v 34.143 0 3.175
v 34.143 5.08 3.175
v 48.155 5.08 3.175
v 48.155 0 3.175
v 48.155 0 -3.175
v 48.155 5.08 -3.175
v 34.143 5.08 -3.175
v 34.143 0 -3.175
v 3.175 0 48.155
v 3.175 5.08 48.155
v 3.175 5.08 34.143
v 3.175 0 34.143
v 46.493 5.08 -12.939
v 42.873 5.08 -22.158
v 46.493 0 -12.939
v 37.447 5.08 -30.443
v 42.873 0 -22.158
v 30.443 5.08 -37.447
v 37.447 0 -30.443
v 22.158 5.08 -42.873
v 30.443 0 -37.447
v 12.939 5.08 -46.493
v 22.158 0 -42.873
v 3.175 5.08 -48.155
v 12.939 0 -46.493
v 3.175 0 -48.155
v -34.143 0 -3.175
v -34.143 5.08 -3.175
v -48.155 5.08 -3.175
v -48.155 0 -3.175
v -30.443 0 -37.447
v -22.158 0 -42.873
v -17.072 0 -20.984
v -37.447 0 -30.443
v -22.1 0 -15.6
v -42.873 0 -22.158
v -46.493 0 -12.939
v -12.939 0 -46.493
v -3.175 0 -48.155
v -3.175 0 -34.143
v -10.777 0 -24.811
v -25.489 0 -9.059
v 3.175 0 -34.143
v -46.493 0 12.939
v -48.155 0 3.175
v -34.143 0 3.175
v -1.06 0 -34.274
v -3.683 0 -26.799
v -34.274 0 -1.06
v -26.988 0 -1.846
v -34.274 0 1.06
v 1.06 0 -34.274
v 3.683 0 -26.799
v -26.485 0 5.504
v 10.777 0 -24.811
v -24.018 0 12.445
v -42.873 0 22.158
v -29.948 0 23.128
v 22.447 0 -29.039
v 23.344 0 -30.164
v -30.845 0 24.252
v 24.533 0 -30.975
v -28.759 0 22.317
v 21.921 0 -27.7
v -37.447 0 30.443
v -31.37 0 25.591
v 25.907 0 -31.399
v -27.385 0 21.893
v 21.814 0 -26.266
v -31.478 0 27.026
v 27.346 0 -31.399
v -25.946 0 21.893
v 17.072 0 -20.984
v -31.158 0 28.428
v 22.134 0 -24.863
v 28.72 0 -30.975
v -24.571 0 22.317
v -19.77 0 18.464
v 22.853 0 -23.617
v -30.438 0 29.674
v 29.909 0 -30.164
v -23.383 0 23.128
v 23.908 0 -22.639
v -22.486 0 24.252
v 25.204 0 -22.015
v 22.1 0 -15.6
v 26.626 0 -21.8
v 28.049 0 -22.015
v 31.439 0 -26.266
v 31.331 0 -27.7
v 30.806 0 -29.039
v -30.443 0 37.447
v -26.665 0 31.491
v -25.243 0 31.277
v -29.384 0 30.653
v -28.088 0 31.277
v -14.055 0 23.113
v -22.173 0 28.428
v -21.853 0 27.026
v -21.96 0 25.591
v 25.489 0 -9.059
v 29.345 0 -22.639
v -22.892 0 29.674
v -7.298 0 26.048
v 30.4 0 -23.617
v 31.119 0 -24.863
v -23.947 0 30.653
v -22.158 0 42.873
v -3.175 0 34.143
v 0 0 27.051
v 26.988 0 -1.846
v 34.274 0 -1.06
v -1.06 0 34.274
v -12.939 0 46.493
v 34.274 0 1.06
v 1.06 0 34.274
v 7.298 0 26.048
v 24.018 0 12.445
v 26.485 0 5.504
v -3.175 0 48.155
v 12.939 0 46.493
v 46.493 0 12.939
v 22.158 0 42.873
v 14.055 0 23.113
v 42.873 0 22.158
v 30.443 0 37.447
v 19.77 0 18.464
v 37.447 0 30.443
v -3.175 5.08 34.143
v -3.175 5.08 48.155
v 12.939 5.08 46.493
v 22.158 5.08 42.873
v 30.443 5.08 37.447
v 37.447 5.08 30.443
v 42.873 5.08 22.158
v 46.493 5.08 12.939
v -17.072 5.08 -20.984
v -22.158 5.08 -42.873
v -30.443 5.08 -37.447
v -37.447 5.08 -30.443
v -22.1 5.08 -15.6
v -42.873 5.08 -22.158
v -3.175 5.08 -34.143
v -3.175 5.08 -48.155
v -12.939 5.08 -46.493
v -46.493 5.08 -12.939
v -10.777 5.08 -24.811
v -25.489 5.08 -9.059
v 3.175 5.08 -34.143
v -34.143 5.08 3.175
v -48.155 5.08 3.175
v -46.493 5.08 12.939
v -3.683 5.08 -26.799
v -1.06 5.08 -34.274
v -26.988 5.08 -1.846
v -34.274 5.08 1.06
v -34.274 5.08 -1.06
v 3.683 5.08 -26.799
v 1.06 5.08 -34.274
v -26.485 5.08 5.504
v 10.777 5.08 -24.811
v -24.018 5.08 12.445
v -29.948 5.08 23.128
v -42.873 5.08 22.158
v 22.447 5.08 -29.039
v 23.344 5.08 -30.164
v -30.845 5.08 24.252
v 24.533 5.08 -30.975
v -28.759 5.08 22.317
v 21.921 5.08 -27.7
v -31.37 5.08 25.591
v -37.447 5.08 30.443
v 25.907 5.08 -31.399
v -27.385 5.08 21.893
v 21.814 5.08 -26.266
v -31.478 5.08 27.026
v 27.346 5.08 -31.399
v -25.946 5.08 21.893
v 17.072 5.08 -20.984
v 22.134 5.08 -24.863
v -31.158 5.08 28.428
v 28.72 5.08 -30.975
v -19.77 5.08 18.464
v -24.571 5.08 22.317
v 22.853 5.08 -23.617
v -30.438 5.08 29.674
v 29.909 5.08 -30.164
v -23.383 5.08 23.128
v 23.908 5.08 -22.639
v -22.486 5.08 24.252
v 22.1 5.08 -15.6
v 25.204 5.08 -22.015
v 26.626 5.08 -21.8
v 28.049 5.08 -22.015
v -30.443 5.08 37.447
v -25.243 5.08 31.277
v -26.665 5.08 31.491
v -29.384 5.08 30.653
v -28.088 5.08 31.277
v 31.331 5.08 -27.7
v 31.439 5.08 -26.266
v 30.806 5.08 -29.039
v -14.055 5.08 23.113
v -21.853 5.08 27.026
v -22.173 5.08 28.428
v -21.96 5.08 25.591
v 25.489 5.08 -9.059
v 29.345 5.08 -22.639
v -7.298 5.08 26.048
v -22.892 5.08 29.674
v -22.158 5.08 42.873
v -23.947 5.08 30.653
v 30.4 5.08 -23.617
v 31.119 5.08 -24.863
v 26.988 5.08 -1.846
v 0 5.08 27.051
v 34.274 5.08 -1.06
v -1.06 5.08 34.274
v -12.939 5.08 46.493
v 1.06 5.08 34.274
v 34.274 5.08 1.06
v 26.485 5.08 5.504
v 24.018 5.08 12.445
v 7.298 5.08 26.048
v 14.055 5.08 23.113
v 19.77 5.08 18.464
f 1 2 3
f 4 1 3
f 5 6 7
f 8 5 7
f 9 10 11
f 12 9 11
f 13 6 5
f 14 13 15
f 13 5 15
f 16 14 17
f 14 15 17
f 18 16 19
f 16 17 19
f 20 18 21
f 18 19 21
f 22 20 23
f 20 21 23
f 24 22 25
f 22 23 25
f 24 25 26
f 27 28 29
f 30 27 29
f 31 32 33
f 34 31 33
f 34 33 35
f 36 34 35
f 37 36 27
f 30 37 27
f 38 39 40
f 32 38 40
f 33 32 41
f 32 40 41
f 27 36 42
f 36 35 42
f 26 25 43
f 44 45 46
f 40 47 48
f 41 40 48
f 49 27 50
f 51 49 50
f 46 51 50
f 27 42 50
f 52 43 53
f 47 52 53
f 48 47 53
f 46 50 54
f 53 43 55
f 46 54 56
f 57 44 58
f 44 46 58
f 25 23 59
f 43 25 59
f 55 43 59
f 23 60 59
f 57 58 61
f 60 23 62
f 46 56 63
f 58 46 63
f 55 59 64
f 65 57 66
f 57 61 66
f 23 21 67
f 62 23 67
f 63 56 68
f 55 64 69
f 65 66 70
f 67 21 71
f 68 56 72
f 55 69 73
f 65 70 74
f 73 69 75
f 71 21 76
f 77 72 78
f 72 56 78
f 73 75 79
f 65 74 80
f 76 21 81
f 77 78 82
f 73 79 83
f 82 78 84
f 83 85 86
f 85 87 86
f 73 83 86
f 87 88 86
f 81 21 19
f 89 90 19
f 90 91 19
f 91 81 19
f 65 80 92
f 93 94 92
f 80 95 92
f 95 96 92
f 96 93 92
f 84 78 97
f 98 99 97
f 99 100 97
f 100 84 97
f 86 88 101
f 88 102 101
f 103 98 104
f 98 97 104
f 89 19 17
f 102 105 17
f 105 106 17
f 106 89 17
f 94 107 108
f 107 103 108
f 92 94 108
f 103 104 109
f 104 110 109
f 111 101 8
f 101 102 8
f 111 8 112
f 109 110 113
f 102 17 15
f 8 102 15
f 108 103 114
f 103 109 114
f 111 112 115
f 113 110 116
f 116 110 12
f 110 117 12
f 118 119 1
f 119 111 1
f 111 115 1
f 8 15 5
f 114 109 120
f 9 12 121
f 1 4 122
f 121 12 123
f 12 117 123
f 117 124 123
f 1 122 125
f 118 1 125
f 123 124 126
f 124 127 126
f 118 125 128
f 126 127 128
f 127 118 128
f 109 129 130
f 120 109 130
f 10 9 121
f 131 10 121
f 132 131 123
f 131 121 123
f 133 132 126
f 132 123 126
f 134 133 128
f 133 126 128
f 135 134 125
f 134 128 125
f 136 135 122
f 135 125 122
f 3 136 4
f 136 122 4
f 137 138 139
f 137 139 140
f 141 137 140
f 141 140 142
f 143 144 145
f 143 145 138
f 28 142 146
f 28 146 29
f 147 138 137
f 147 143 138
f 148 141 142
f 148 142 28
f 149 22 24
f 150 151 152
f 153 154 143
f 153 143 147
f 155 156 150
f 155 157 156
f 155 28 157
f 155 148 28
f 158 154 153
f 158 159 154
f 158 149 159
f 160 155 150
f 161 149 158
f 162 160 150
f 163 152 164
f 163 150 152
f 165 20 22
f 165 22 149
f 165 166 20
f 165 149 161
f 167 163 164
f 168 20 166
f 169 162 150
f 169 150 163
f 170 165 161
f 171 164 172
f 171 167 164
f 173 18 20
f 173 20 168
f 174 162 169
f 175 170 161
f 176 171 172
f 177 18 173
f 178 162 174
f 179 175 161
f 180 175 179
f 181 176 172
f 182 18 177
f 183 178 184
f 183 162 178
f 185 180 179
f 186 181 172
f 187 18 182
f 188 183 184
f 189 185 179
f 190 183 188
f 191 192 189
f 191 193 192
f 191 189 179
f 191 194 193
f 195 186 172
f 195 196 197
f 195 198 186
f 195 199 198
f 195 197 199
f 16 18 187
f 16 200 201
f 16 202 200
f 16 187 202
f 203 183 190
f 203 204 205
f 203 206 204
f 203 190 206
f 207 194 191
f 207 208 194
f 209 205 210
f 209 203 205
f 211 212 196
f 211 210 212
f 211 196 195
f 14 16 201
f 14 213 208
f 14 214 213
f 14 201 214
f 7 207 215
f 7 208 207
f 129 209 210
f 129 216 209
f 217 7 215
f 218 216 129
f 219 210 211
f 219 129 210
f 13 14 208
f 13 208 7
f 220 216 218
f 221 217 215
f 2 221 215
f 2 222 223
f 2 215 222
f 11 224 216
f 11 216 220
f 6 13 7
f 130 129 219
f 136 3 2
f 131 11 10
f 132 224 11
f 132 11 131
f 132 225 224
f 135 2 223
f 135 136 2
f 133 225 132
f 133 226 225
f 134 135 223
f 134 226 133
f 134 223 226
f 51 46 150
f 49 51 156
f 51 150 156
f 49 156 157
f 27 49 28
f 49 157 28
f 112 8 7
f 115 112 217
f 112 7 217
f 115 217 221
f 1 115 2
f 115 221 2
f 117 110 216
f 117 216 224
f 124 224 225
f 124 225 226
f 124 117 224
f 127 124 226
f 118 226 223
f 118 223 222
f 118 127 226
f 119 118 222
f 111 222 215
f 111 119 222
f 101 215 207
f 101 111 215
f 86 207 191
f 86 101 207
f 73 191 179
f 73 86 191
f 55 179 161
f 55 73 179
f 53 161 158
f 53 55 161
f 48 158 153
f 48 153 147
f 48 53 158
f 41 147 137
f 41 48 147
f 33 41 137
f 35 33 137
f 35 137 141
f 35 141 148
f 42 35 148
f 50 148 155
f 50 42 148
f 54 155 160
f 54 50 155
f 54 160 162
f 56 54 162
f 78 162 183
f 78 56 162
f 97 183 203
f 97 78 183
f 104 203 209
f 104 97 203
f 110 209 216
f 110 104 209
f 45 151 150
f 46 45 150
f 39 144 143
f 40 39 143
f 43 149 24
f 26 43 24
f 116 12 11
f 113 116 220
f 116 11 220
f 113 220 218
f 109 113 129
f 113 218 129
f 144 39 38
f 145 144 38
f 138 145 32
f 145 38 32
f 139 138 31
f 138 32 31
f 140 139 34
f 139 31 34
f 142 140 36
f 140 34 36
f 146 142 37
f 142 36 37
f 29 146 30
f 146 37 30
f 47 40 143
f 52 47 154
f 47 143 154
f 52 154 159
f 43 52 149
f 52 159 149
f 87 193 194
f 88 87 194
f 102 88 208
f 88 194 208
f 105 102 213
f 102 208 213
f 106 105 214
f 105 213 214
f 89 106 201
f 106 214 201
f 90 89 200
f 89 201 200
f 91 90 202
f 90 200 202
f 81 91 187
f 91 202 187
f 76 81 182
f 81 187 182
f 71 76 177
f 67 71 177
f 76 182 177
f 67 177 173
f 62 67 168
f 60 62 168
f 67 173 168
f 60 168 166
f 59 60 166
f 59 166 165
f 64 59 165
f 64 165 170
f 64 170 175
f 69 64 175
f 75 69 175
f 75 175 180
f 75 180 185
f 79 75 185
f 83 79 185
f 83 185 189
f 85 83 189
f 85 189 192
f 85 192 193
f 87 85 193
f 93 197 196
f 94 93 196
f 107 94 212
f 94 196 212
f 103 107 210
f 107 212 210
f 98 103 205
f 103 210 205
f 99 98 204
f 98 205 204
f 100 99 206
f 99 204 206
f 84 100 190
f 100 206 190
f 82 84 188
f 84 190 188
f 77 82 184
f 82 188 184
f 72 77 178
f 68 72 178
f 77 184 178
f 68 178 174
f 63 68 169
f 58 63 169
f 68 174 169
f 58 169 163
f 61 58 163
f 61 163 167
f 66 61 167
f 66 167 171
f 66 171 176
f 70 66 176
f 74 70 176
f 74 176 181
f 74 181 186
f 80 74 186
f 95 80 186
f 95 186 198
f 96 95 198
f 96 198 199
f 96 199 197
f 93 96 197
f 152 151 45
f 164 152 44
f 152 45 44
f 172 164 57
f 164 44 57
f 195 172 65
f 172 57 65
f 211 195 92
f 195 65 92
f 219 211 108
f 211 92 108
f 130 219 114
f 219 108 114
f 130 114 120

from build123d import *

# Parameters (mm, degrees)
SKETCH1_R           = 48.26
SKETCH1_R_2         = 27.051
BOSS_EXTRUDE1_DEPTH = 5.08
CUT_EXTRUDE1_DEPTH  = 69.438743413
SKETCH3_R           = 4.826
CUT_EXTRUDE2_DEPTH  = 69.29129044


with BuildPart() as part:
    # Sketch1 → Boss-Extrude1 (new body)
    with BuildSketch(Plane(origin=(0, 0, 0), x_dir=(1, 0, 0), z_dir=(0, 1, 0))):
        with Locations(Location((0, 0, 0), (0, 0, 270))):
            Circle(SKETCH1_R)
        with Locations(Location((0, 0, 0), (0, 0, 270))):
            Circle(SKETCH1_R_2, mode=Mode.SUBTRACT)
    extrude(amount=BOSS_EXTRUDE1_DEPTH)

    # Sketch2 → Cut-Extrude1 (cut, through all)
    with BuildSketch(Plane(origin=(0, 5.08, 0), x_dir=(1, 0, 0), z_dir=(0, 1, 0))):
        with BuildLine():
            ThreePointArc((-34.142692849, -3.175), (-34.29, 0), (-34.142692849, 3.175))
            Line((-34.142692849, 3.175), (-48.155445954, 3.175))
            ThreePointArc((-48.155445954, 3.175), (-48.26, 0), (-48.155445954, -3.175))
            Line((-48.155445954, -3.175), (-34.142692849, -3.175))
        make_face()
        with BuildLine():
            ThreePointArc((48.26, 0), (48.233854406, 1.588360519), (48.155445954, 3.175))
            Line((48.155445954, 3.175), (34.142692849, 3.175))
            ThreePointArc((34.142692849, 3.175), (34.29, 0), (34.142692849, -3.175))
            Line((34.142692849, -3.175), (48.155445954, -3.175))
            ThreePointArc((48.155445954, -3.175), (48.233854406, -1.588360519), (48.26, 0))
        make_face()
        with BuildLine():
            Line((-3.175, -34.142692849), (-3.175, -48.155445954))
            ThreePointArc((-3.175, -48.155445954), (0, -48.26), (3.175, -48.155445954))
            Line((3.175, -48.155445954), (3.175, -34.142692849))
            ThreePointArc((3.175, -34.142692849), (0, -34.29), (-3.175, -34.142692849))
        make_face()
        with BuildLine():
            ThreePointArc((3.175, 48.155445954), (0, 48.26), (-3.175, 48.155445954))
            Line((-3.175, 48.155445954), (-3.175, 34.142692849))
            ThreePointArc((-3.175, 34.142692849), (0, 34.29), (3.175, 34.142692849))
            Line((3.175, 34.142692849), (3.175, 48.155445954))
        make_face()
    extrude(amount=-CUT_EXTRUDE1_DEPTH, mode=Mode.SUBTRACT)

    # Sketch3 → Cut-Extrude2 (cut, through all)
    with BuildSketch(Plane(origin=(0, 5.08, 0), x_dir=(1, 0, 0), z_dir=(0, 1, 0))):
        with Locations(Location((-26.665276966, -26.665276966, 0), (0, 0, 270))):
            Circle(SKETCH3_R)
        with Locations(Location((26.626459399, 26.626459399, 0), (0, 0, 270))):
            Circle(SKETCH3_R)
    extrude(amount=-CUT_EXTRUDE2_DEPTH, mode=Mode.SUBTRACT)


solid = part.part
